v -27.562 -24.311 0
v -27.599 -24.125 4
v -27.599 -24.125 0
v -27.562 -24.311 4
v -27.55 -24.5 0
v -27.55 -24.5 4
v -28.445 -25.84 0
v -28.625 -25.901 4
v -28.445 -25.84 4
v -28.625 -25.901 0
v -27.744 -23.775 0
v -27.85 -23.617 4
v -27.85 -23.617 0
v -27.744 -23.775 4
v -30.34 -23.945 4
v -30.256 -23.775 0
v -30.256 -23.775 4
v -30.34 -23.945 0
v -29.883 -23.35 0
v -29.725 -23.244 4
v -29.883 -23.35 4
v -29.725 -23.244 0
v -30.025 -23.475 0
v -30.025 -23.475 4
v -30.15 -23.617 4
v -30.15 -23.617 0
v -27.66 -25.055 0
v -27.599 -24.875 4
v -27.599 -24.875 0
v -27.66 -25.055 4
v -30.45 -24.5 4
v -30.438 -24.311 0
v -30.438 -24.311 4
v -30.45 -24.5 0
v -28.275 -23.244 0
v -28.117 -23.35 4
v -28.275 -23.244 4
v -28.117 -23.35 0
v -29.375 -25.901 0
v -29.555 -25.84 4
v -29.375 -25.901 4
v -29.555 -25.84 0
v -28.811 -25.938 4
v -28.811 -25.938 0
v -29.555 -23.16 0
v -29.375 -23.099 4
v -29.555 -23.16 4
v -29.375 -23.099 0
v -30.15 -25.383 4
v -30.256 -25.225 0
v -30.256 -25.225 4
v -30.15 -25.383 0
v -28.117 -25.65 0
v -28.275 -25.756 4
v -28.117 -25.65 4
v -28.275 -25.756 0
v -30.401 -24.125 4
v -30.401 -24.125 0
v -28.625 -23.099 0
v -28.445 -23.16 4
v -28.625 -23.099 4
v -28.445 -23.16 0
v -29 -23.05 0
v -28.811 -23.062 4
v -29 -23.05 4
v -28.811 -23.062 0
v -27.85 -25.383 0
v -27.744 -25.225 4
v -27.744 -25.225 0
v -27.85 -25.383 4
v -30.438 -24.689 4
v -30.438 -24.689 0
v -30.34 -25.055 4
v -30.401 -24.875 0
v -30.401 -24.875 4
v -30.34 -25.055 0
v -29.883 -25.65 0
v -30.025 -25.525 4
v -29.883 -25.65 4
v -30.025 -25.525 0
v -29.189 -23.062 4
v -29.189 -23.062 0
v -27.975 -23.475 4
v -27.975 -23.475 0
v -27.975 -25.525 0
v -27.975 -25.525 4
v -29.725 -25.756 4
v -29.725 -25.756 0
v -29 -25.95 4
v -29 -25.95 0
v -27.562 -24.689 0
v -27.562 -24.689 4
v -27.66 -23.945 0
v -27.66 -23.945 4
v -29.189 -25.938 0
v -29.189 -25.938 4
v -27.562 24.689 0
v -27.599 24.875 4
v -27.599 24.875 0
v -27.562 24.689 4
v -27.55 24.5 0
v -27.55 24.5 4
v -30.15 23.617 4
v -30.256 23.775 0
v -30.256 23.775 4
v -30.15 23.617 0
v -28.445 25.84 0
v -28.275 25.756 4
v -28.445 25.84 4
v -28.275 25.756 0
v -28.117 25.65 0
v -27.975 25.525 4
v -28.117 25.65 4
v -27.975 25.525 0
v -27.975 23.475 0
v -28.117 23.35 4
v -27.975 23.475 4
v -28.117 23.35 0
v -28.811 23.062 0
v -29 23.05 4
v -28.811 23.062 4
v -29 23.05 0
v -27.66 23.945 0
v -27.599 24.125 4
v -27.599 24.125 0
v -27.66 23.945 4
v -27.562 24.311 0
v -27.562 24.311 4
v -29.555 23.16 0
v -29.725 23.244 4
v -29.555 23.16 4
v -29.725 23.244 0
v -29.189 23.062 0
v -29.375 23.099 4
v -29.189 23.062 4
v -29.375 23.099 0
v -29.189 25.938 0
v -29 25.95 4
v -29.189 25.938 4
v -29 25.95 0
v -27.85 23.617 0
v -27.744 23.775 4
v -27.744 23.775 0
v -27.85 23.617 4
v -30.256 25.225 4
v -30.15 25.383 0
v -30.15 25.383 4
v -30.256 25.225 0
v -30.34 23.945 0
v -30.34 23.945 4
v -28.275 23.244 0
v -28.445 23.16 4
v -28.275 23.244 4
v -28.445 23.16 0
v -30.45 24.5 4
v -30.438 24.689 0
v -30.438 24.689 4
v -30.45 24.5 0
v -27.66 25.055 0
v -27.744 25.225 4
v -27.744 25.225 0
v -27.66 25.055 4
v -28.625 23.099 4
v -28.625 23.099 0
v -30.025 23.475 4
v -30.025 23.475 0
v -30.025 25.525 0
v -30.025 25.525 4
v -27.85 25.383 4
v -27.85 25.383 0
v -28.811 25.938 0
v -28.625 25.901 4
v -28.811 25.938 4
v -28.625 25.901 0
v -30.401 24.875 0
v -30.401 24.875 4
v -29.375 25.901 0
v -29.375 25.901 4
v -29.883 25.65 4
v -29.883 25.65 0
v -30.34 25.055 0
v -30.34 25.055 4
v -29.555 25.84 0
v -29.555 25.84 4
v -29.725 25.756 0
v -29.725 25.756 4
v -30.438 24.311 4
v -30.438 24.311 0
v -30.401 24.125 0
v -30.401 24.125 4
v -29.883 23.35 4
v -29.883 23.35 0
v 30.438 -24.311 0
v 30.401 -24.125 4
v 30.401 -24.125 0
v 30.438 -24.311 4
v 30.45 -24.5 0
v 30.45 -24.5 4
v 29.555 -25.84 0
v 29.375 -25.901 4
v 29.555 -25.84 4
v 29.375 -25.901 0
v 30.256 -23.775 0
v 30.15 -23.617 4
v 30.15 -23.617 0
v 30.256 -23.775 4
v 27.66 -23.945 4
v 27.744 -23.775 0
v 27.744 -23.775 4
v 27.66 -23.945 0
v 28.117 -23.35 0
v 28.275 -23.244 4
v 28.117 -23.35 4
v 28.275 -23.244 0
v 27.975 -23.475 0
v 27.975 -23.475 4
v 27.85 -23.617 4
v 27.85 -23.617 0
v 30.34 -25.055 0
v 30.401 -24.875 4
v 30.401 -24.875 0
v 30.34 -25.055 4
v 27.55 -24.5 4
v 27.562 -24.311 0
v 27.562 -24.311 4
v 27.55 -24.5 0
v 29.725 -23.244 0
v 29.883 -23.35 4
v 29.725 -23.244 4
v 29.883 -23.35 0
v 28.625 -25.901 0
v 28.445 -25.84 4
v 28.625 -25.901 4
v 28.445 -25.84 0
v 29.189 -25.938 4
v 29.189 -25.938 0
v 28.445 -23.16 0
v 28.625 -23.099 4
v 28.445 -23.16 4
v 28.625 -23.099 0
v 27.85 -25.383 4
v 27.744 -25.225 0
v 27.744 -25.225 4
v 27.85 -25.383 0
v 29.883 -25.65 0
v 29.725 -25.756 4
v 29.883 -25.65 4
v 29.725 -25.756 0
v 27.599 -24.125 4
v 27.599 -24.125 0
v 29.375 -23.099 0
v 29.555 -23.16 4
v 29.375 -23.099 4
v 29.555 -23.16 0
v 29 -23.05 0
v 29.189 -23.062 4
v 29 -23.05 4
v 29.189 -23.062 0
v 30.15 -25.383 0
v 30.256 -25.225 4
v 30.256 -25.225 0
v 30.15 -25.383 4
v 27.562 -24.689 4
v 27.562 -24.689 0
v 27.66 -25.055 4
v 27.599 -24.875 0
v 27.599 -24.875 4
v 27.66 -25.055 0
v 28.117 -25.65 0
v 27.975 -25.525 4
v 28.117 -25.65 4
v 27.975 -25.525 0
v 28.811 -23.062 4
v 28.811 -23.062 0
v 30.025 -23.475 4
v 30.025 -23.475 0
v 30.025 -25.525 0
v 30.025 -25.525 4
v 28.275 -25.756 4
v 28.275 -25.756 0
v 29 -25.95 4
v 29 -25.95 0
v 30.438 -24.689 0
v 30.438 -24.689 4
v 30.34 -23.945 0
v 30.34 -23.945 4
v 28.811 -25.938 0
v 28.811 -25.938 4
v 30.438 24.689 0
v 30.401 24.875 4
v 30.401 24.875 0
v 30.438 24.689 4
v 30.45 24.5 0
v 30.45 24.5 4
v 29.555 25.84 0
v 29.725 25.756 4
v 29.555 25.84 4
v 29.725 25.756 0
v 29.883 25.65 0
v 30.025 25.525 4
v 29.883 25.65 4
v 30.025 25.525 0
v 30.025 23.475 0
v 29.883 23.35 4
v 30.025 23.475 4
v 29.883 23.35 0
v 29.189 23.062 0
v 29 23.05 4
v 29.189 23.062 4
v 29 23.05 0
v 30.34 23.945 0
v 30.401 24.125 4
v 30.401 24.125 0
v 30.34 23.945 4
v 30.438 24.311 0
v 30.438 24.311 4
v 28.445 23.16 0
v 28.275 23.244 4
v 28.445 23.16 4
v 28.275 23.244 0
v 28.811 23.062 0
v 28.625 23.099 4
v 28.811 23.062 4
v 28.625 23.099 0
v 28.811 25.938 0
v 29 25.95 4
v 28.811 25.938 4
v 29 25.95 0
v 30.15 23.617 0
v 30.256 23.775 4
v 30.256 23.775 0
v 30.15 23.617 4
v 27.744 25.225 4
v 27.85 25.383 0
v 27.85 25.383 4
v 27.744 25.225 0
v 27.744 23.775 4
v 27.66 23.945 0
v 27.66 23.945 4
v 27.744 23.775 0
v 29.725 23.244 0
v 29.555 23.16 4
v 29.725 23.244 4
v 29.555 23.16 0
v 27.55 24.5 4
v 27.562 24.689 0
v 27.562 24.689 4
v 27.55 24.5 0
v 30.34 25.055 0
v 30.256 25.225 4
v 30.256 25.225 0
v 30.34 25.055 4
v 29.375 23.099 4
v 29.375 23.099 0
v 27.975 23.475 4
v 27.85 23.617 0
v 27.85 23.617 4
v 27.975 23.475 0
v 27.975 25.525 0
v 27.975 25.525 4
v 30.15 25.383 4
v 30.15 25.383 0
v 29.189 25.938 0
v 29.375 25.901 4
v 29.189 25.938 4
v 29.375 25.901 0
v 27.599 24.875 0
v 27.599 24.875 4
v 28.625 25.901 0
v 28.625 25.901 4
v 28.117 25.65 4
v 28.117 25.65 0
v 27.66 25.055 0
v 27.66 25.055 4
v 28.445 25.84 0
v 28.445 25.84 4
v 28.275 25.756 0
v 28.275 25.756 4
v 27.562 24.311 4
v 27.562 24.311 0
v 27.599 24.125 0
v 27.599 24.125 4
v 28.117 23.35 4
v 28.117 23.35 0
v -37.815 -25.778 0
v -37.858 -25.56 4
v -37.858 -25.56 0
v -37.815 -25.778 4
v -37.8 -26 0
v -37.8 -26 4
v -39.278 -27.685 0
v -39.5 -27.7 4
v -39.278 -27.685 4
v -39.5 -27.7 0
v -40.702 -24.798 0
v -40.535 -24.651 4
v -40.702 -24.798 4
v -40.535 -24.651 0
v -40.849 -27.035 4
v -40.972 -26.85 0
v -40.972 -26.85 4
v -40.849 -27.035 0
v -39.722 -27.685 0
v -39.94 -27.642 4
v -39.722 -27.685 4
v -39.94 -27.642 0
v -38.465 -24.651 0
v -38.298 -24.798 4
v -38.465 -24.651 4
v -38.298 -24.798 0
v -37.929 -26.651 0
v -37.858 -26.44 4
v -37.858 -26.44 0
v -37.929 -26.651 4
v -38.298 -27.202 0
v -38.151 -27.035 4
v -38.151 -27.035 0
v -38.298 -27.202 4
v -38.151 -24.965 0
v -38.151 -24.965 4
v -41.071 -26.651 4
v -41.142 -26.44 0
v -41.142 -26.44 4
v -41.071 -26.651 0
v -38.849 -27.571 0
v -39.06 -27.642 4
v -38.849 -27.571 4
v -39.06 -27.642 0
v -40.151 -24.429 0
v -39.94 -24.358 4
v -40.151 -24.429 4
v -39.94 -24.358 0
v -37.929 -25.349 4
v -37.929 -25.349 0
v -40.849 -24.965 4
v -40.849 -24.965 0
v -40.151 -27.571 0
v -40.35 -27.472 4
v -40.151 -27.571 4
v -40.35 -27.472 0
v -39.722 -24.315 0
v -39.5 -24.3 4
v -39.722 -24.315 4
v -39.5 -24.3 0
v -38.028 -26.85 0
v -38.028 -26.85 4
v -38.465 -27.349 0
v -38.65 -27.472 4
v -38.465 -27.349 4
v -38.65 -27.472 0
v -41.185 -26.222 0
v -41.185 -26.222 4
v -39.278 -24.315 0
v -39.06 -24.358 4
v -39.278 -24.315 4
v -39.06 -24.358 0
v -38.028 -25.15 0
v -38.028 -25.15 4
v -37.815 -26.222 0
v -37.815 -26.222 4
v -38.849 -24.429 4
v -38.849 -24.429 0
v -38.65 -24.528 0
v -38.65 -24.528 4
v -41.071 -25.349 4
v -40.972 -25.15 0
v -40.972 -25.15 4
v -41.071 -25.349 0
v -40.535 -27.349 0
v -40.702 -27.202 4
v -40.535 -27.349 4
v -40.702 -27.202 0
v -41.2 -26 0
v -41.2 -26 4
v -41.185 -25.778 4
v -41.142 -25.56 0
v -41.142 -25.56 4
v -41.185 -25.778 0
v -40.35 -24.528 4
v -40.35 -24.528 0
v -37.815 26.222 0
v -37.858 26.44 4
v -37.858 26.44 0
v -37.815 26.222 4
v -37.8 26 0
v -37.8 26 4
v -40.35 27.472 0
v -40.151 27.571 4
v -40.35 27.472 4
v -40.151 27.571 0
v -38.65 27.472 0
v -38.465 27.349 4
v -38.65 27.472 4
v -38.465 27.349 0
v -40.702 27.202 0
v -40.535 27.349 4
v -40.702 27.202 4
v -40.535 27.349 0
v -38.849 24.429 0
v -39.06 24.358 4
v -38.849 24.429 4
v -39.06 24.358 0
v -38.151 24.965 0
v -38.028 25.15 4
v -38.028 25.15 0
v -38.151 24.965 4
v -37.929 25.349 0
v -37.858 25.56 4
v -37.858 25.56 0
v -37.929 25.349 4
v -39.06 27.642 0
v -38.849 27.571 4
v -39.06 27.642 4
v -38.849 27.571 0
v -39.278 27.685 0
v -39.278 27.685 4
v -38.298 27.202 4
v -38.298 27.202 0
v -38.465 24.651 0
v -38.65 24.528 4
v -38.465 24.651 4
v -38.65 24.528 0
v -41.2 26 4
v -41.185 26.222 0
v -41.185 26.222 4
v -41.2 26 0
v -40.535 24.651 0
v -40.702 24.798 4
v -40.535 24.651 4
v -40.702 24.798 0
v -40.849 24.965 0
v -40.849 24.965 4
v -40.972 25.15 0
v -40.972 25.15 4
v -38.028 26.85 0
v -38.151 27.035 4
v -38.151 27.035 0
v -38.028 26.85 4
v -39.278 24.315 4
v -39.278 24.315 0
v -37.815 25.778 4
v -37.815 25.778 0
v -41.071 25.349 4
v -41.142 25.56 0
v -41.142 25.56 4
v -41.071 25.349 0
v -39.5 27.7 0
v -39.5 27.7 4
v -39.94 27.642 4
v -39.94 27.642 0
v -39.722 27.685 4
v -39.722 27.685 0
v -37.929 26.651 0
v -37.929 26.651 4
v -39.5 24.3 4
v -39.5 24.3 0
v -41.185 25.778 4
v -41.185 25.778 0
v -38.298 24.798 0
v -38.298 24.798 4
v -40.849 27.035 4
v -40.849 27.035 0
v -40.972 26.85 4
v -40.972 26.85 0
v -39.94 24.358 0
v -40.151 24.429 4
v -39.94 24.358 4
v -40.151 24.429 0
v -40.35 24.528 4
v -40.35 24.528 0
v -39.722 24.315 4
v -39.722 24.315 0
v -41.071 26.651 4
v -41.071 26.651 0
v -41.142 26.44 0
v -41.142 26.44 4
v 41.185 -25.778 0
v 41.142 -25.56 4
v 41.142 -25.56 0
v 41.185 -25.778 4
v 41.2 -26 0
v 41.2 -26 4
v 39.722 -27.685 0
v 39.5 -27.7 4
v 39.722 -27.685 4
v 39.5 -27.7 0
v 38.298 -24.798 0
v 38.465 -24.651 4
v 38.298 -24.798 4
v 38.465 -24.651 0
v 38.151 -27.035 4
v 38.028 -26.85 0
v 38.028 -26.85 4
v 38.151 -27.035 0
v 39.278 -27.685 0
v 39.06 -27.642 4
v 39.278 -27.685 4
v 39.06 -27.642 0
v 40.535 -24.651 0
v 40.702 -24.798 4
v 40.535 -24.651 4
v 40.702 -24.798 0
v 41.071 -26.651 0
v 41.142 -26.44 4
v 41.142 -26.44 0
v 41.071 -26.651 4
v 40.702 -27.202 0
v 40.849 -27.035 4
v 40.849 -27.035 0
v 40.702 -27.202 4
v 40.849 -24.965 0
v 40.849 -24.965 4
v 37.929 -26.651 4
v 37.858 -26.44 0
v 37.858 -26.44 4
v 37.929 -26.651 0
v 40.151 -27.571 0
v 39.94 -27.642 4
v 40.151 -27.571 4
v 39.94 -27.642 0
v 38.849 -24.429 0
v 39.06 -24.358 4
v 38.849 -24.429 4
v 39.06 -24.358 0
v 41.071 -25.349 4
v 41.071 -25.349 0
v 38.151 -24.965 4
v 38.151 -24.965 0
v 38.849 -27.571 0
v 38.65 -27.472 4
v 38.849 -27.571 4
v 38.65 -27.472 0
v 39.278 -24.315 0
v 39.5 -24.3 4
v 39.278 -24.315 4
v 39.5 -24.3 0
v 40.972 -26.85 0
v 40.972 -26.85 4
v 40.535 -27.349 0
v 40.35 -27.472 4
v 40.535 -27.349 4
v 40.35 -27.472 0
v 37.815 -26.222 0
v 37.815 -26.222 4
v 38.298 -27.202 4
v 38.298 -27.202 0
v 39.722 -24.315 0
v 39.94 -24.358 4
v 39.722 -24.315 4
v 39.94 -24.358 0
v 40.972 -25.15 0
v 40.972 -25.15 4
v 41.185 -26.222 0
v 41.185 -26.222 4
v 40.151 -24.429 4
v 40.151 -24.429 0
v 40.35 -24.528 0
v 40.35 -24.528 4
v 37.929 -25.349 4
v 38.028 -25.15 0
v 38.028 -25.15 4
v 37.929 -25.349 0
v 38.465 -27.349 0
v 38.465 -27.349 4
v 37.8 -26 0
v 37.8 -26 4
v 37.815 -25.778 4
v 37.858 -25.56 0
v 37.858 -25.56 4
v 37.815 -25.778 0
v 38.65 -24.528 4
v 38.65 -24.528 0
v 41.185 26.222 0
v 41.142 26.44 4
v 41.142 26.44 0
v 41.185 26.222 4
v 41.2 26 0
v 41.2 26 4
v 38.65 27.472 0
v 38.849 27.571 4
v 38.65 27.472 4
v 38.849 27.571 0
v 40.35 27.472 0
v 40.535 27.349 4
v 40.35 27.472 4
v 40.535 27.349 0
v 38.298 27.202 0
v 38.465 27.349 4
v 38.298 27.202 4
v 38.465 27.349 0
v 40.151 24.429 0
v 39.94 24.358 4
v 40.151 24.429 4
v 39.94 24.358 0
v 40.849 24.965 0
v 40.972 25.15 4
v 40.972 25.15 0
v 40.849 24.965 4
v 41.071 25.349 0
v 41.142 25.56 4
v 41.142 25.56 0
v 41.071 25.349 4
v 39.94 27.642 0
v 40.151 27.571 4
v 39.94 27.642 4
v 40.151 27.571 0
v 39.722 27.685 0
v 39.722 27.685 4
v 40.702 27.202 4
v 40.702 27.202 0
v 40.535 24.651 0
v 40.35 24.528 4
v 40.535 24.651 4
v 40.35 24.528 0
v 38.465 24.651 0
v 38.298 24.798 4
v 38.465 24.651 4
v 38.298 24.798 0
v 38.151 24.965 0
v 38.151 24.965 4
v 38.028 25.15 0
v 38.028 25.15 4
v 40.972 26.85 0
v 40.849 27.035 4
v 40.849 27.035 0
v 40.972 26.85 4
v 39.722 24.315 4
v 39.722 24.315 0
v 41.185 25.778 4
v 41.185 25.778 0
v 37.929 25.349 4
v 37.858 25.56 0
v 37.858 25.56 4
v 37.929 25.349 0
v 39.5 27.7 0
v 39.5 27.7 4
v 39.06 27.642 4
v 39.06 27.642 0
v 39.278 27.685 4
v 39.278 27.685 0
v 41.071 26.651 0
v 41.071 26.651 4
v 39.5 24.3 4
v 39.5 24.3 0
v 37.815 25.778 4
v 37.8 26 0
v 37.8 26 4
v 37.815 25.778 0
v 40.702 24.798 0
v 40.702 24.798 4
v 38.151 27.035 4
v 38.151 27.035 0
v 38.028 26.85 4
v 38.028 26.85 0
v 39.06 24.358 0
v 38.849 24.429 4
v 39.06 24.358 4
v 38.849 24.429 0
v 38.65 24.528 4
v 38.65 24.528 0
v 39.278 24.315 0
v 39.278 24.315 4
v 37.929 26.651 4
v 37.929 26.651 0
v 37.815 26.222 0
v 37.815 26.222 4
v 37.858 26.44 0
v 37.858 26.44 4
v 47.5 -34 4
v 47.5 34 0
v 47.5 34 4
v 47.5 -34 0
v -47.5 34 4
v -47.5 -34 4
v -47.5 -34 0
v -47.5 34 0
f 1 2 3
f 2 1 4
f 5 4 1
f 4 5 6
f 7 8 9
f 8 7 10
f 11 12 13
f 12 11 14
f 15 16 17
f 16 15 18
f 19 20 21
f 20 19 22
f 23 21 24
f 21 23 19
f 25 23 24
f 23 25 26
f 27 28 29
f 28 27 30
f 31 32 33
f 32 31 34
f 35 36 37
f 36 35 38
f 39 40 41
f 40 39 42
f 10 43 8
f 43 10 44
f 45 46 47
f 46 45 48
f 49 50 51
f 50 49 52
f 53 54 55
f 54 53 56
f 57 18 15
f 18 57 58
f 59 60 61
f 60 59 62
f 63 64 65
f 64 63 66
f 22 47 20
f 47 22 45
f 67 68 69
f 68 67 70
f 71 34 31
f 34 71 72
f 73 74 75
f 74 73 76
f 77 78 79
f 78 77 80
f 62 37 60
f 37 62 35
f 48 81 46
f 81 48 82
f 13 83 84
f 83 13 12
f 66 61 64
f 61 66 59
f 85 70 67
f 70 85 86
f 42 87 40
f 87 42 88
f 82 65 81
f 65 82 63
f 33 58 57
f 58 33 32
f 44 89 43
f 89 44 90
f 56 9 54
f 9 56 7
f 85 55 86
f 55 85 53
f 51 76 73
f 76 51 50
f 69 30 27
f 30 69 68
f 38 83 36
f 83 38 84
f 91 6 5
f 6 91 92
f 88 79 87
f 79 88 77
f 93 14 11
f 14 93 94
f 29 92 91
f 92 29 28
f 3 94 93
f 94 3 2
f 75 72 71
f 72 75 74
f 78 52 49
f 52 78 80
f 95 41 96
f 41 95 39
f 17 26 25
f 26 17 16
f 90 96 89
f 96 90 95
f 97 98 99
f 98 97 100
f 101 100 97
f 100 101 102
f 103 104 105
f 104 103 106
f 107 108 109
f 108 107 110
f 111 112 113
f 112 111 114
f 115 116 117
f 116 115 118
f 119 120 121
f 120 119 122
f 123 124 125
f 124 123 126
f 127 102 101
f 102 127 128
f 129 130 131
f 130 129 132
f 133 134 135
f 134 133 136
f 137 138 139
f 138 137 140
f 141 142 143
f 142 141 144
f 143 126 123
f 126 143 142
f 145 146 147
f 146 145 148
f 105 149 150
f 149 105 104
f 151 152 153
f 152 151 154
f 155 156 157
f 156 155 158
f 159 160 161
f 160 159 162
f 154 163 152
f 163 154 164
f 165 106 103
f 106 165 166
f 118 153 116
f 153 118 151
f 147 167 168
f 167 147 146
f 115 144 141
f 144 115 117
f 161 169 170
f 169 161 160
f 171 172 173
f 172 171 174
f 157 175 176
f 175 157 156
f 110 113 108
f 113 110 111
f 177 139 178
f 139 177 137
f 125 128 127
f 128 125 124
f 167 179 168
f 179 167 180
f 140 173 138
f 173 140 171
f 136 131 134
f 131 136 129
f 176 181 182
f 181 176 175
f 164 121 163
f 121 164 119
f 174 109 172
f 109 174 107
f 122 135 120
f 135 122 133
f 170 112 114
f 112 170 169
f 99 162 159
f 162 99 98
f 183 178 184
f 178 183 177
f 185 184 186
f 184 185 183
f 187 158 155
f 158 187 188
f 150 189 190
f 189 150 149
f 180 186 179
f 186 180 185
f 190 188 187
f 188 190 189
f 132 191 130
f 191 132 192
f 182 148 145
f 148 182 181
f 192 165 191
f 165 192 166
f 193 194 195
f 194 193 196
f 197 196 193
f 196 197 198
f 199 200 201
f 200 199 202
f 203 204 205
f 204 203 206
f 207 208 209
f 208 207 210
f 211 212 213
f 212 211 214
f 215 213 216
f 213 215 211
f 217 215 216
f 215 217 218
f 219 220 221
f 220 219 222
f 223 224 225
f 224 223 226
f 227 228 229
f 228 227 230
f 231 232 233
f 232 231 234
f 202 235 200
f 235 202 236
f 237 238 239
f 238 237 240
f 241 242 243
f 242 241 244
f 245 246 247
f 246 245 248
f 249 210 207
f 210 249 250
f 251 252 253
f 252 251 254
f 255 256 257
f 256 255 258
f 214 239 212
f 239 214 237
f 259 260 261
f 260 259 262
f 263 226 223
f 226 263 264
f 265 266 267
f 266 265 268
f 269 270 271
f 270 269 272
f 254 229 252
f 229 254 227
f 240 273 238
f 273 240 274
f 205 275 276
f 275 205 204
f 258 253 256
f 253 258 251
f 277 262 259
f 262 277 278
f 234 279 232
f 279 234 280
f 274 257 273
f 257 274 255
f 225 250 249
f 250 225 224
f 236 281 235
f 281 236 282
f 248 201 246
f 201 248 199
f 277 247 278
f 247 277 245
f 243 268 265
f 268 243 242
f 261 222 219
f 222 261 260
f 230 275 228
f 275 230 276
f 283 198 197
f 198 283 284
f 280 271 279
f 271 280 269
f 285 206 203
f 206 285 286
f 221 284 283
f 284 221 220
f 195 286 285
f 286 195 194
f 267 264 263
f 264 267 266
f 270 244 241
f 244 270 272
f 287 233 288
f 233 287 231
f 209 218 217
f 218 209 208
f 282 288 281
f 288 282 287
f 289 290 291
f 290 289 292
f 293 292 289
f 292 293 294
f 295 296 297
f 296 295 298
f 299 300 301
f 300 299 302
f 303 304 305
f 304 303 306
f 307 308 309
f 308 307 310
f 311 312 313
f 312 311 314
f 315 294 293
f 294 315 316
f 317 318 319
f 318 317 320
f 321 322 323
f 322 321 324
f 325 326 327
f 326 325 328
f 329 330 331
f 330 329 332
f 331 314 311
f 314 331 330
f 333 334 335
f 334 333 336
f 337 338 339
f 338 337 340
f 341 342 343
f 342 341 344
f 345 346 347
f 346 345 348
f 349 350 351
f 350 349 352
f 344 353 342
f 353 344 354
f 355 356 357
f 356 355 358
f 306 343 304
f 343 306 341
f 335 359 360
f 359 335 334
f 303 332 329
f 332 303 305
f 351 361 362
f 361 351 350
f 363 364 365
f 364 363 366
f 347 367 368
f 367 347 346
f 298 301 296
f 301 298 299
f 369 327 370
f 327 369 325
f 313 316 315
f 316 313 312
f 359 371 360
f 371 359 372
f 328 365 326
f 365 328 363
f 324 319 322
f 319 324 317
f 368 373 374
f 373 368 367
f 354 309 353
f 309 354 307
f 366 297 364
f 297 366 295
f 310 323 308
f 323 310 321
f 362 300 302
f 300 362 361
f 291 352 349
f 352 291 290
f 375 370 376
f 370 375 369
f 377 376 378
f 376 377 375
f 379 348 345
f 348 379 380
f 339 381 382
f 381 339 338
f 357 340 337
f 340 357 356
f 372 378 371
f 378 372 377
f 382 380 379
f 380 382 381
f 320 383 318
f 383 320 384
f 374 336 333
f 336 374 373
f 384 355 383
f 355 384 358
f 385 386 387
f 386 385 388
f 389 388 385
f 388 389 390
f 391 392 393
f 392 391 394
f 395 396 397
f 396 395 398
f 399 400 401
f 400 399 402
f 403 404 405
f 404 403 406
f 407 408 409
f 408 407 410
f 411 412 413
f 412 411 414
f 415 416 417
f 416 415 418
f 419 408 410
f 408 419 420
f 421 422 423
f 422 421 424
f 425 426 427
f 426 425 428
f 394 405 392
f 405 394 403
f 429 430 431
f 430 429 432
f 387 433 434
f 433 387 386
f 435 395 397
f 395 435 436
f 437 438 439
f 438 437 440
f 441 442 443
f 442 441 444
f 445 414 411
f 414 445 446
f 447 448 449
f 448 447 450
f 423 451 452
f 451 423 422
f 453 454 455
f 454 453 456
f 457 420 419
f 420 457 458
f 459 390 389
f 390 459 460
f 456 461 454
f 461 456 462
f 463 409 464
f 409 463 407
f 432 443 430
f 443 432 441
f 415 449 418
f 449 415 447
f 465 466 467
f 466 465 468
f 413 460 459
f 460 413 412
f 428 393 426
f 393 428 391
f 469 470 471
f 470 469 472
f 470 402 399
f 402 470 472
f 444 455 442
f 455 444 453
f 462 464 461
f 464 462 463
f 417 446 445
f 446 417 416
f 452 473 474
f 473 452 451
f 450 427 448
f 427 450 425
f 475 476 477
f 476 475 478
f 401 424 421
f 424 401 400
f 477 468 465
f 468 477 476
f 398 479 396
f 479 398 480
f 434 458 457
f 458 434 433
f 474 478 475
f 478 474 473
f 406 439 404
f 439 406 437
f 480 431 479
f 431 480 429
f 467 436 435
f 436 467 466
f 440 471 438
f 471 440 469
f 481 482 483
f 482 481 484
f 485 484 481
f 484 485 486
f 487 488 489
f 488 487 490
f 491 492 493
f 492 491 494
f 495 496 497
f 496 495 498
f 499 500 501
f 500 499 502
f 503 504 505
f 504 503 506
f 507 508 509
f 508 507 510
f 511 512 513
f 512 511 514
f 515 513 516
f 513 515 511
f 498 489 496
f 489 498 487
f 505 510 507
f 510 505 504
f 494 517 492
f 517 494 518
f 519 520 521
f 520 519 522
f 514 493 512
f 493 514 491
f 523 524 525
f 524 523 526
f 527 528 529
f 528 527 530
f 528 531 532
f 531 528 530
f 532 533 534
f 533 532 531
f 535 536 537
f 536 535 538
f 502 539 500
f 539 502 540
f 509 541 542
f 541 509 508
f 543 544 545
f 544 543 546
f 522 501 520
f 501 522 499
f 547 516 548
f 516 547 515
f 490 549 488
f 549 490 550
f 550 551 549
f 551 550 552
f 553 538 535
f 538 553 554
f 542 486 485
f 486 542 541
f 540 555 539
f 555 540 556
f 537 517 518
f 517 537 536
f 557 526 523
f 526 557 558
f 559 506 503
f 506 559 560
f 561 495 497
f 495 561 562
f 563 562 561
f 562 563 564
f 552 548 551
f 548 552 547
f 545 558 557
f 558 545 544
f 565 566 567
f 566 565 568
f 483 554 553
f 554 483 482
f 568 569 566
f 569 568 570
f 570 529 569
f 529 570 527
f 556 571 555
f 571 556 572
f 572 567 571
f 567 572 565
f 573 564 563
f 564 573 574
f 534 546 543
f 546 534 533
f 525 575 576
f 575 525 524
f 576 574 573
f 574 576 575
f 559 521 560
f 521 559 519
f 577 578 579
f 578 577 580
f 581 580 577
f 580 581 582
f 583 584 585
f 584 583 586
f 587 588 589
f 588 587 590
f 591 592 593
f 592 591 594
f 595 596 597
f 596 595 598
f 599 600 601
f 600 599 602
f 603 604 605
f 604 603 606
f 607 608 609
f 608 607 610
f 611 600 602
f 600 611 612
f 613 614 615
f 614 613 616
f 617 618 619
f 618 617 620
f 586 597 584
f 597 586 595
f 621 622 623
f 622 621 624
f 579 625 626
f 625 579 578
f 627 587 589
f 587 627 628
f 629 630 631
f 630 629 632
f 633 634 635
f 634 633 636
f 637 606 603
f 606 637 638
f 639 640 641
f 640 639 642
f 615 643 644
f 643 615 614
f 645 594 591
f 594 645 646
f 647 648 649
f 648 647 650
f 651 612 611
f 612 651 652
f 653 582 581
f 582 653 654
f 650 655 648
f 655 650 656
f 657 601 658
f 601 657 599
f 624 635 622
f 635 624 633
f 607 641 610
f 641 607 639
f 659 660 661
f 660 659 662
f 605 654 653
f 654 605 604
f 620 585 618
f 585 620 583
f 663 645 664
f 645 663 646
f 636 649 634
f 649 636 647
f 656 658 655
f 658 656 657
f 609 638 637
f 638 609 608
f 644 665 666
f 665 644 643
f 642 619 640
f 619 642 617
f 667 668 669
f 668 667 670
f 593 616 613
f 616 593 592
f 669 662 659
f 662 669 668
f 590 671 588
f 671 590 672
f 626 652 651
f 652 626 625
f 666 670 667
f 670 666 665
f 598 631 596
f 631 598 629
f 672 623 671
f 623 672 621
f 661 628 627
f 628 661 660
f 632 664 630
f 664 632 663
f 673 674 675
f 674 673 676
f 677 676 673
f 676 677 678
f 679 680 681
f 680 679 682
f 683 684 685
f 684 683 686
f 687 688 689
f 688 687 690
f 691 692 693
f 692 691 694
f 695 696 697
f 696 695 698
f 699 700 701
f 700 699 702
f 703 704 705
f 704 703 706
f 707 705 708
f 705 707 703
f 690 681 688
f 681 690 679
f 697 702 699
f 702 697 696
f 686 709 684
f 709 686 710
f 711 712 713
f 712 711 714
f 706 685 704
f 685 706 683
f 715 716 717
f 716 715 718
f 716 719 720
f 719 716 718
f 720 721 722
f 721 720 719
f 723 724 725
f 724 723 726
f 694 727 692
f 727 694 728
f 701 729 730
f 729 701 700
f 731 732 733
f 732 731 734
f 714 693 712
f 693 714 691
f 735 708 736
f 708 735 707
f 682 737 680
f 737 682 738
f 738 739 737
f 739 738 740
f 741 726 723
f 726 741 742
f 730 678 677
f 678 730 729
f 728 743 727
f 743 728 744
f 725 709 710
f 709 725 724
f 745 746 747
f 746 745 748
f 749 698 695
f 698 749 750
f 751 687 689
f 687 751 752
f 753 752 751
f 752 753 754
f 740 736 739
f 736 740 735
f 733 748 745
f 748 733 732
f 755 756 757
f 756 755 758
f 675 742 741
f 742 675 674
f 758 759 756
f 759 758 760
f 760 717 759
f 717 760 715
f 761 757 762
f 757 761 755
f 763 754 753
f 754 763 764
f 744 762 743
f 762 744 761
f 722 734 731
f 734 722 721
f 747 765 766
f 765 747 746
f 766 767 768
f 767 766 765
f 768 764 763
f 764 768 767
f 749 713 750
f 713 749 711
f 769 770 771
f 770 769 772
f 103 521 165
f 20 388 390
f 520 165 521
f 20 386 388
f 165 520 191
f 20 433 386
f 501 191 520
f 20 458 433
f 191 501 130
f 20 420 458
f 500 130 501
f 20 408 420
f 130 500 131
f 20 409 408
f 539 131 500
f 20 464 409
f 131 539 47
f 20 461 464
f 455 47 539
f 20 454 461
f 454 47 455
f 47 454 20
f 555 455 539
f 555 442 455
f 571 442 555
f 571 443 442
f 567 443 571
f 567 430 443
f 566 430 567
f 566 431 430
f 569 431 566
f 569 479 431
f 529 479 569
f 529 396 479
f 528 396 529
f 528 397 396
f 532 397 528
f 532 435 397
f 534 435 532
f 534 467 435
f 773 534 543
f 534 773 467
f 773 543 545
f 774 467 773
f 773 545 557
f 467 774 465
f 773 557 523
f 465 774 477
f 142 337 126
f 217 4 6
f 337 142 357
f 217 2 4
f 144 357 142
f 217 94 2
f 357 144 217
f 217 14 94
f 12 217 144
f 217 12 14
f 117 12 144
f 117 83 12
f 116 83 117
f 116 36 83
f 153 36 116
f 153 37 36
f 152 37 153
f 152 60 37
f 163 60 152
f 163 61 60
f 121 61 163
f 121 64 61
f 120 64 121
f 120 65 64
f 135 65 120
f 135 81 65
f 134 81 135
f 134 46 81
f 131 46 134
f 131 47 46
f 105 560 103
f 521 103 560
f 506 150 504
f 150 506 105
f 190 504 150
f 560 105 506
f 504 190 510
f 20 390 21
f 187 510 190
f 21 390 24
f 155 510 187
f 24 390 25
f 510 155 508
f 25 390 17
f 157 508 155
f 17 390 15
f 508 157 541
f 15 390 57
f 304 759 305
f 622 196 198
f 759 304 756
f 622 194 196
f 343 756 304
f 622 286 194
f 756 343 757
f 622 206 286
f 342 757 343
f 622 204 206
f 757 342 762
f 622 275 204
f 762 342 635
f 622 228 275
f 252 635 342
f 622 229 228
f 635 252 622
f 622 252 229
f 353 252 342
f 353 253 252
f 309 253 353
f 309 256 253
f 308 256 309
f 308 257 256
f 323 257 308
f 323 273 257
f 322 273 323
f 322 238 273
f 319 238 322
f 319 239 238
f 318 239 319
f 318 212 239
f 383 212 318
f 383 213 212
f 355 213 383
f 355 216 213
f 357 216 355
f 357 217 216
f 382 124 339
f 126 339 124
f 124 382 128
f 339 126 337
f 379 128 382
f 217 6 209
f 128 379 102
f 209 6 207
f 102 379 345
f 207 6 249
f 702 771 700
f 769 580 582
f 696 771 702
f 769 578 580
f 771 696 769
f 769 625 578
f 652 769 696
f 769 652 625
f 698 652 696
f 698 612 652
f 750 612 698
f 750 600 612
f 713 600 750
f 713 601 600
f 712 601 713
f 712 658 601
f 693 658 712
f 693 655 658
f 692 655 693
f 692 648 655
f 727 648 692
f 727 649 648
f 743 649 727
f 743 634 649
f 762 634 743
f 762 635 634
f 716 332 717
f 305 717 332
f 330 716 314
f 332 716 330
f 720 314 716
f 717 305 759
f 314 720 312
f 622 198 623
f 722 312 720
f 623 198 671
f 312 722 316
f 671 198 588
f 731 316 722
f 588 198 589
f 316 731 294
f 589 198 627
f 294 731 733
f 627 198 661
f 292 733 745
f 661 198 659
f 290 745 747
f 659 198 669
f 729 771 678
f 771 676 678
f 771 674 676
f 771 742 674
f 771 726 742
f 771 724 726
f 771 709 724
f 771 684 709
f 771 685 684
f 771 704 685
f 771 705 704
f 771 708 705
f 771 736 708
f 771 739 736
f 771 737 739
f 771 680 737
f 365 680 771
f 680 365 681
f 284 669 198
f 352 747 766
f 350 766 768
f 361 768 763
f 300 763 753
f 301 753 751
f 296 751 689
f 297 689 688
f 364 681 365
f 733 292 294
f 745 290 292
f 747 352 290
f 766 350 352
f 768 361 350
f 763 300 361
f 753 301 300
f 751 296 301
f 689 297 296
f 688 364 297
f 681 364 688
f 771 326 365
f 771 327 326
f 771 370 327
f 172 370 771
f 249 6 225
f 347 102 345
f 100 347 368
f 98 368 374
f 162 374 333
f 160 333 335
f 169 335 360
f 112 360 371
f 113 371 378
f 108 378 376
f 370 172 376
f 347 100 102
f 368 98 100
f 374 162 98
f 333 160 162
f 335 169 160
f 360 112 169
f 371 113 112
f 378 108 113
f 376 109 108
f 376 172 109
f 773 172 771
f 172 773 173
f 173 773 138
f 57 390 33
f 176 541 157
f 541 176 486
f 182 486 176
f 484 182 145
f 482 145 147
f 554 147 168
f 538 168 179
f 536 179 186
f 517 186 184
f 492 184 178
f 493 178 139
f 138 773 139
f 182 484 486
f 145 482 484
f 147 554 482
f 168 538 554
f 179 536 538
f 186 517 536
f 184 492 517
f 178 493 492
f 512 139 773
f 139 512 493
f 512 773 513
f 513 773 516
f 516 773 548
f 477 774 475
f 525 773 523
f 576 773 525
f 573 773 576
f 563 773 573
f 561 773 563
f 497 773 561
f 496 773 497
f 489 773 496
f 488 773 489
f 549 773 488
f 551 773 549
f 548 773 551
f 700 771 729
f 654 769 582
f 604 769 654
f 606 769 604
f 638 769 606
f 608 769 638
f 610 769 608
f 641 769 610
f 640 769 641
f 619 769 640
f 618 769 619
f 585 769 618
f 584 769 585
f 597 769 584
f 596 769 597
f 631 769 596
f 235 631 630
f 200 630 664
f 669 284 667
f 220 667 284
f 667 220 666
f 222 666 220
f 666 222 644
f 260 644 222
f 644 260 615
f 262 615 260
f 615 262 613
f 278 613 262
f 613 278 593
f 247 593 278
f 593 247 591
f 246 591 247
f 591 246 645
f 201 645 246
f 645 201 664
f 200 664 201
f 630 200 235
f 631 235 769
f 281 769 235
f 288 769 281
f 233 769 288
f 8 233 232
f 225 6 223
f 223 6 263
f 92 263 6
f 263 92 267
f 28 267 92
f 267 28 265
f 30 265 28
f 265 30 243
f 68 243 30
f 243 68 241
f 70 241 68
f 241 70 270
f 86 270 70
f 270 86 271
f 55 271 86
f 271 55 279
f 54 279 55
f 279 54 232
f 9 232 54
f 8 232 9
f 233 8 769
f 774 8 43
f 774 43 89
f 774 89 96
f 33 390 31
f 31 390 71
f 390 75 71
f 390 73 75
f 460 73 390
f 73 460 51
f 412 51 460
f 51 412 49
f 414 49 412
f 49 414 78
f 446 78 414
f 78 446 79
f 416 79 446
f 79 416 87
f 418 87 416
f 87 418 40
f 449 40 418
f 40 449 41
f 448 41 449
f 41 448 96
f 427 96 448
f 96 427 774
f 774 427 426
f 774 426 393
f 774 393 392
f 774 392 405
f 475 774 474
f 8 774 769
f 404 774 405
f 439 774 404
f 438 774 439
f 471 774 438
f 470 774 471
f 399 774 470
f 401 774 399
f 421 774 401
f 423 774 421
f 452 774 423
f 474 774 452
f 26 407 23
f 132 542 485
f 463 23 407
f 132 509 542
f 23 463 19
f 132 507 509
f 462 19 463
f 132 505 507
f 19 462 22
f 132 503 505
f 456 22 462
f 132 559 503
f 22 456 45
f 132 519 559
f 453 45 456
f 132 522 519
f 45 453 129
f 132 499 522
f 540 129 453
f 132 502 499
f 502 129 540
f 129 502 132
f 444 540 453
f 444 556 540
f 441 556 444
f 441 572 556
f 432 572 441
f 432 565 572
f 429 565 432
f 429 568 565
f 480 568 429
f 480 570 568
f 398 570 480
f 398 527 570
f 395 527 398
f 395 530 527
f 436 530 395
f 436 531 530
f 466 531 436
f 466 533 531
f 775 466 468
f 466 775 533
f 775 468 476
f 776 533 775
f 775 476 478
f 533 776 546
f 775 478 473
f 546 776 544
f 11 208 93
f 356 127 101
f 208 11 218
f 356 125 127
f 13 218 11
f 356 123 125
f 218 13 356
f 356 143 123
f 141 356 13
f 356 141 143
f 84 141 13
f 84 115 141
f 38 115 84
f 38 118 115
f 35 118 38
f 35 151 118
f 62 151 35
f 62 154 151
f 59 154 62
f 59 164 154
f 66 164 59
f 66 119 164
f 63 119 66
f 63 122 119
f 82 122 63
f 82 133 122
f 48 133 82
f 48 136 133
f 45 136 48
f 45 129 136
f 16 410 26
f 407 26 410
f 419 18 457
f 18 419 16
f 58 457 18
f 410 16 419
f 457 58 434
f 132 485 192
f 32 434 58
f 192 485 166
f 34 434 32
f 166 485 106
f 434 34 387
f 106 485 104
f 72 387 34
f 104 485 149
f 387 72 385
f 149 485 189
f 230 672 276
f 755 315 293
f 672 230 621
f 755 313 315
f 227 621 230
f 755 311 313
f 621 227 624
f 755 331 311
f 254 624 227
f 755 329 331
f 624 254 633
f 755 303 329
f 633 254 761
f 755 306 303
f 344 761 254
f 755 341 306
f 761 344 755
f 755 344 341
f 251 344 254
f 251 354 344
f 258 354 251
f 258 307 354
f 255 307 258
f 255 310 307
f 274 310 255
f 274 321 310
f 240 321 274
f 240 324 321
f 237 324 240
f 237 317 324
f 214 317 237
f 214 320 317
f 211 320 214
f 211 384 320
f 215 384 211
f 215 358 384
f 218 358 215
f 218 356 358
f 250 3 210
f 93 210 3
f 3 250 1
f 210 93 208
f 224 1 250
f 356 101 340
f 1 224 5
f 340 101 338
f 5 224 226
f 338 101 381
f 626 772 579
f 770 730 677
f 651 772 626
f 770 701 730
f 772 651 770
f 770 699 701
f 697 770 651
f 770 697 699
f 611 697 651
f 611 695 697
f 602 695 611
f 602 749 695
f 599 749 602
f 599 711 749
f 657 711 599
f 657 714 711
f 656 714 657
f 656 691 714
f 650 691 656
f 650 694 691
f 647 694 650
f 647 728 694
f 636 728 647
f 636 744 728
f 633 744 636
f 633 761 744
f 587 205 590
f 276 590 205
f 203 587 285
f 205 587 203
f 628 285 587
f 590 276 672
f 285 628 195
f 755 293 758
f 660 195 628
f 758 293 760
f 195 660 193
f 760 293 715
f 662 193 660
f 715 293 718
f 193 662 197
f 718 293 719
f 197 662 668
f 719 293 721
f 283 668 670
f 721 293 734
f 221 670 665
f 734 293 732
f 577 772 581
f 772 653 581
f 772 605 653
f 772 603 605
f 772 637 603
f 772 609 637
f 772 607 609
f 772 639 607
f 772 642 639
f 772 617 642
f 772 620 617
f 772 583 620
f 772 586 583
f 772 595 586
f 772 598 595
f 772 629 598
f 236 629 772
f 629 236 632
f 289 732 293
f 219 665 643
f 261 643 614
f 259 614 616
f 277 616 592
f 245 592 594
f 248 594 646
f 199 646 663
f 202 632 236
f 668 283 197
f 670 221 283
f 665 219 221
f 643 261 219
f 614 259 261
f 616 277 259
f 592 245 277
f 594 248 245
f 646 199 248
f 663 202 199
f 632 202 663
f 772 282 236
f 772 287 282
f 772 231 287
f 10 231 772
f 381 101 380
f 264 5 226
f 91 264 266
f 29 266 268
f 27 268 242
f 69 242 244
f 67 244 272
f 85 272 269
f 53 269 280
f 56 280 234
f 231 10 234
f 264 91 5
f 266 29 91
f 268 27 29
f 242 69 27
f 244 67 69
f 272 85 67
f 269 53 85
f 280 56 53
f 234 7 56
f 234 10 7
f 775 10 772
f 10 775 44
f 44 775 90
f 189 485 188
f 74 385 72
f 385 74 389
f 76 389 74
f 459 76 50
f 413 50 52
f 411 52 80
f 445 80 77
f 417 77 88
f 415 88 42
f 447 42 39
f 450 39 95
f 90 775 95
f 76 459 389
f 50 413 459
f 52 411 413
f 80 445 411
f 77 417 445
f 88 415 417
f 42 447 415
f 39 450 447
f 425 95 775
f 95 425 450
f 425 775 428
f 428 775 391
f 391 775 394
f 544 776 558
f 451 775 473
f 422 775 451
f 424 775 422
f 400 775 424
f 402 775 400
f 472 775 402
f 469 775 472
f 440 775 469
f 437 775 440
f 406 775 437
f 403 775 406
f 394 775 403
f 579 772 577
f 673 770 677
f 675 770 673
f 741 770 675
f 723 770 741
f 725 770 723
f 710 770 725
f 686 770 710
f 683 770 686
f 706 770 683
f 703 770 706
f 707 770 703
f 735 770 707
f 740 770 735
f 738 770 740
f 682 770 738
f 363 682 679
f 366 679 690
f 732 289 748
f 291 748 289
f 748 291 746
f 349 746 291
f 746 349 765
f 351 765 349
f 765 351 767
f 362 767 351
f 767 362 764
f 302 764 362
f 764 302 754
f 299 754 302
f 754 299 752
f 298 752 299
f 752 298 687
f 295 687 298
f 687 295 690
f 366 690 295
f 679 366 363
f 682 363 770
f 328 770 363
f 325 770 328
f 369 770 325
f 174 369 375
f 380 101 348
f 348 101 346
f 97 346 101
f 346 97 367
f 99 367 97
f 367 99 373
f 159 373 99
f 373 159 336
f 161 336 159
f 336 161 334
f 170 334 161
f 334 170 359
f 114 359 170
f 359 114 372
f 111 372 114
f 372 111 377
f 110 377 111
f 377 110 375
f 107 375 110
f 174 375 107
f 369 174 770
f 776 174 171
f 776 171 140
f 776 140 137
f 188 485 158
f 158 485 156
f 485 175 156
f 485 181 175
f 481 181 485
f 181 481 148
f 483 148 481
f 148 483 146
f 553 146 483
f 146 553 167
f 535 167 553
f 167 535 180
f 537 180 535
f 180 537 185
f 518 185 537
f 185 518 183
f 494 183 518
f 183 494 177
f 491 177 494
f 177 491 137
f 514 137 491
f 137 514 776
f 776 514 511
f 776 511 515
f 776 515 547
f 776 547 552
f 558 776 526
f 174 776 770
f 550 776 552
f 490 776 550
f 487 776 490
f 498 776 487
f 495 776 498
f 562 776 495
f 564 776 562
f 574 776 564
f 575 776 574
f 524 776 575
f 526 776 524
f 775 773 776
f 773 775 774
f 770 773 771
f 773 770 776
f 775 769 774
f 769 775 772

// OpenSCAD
// file: helpers.scad
// Shared building blocks. Convention: every part's own joint-to-joint axis
// is local Z, so end plates are naturally perpendicular to it and holes bore
// straight along Z. Whole parts get rotated into the world only when placed
// into an assembly view - never inside a single part's own file.
include <params.scad>

// A boss with a heat-set-insert bore, sized to sit inside a wall.
module insert_boss(h) {
    difference() {
        cylinder(d = insert_d + wall, h = h);
        translate([0, 0, h - insert_depth])
            cylinder(d = insert_d, h = insert_depth + 0.1);
    }
}

// Four insert bosses in a rectangle, base sitting on z=0.
module bolt_pattern(x, y, h) {
    for (sx = [-1, 1]) for (sy = [-1, 1])
        translate([sx * x / 2, sy * y / 2, 0]) insert_boss(h);
}

// Clearance holes through a slab of thickness h, for the mating part.
module bolt_holes(x, y, d, h) {
    for (sx = [-1, 1]) for (sy = [-1, 1])
        translate([sx * x / 2, sy * y / 2, -0.1]) cylinder(d = d, h = h + 0.2);
}

// Horn-side bolt circle, holes along Z, through a slab of thickness h - see
// params.scad for why the fourth hole sits at a smaller radius.
module horn_bolt_circle(h) {
    for (a = [0, 90, 180]) rotate([0, 0, a])
        translate([horn_bolt_r_major, 0, -0.1]) cylinder(d = horn_bolt_d, h = h + 0.2);
    rotate([0, 0, 270]) translate([horn_bolt_r_minor, 0, -0.1])
        cylinder(d = horn_bolt_d, h = h + 0.2);
    translate([0, 0, -0.1]) cylinder(d = horn_hub_d, h = h + 0.2);
}

// A round plate carrying the horn bolt circle, face normal along Z, sitting
// at z=[0,h]. This is what a leg segment bolts to a servo's rotating horn.
module horn_plate(h) {
    d = horn_bolt_r_major * 2 + 10;
    difference() {
        cylinder(d = d, h = h);
        horn_bolt_circle(h);
    }
}

// A square plate carrying the bracket's own flange holes - ADJUSTABLE, see
// params.scad. This is what a leg segment bolts to the downloaded bracket.
module bracket_plate(h) {
    side = bracket_hole_x + 12;
    difference() {
        translate([-side / 2, -side / 2, 0]) cube([side, side, h]);
        bolt_holes(bracket_hole_x, bracket_hole_y, bracket_screw_d, h);
    }
}

// The ST3215 body pocket: servo drops in from the open top, its case (not
// the gearbox) bearing on the lip.
module servo_pocket(depth) {
    l = servo_l + 2 * servo_fit;
    w = servo_w + 2 * servo_fit;
    translate([-l / 2, -w / 2, 0]) cube([l, w, depth + 0.1]);
}
// file: params.scad
// ==================== source of truth ====================
// Every VERIFIED number below is cross-referenced to either this repo's own
// simulation model (src/robot_cat_description/urdf/cat.urdf.xacro at scale
// 1.0, and robot_cat_gait/leg_ik.py) or an independently checked datasheet -
// see hardware/cad/README.md for exactly what was checked and against what.
//
// ADJUSTABLE numbers are flagged because the one thing they depend on - the
// downloaded servo bracket's own mounting face - could not be fetched from
// Printables/Thingiverse in this session (both block automated access).
// Print ONE part that uses an ADJUSTABLE value, hold it against the real
// bracket, correct the number, then print the rest. Everything else here is
// safe to print in full sets straight away.

// ---- leg geometry - VERIFIED, must match leg_ik.py exactly ----
thigh_length = 110;   // LegGeometry.thigh_length, axis to axis
calf_length  = 110;   // LegGeometry.calf_length, axis to paw centre
hip_offset   = 25;    // hip roll axis -> thigh pitch axis, lateral
foot_radius  = 12;    // paw pad sphere radius

// ---- trunk geometry - VERIFIED ----
hip_x = 110;          // hip mount, x from body centre (so 220mm hip-to-hip)
hip_y = 55;           // hip mount, y from body centre (so 110mm hip-to-hip)
body_length = 300;
body_width  = 111;
body_height = 141;

// ---- ST3215 servo body - VERIFIED: DFRobot product page (2962) and
// servodatabase.com both give 45.2 x 24.7 x 35.0 mm ----
servo_l = 45.2;
servo_w = 24.7;
servo_h = 35.0;
servo_fit = 0.4;      // FDM clearance added per side around the pocket

// ---- Raspberry Pi 5 mounting - VERIFIED against the official Raspberry Pi
// Ltd mechanical drawing (RP-008347-DS-1): 58 x 49mm hole spacing, Ø2.7mm
// holes (clearance for M2.5) ----
pi_hole_x = 58;
pi_hole_y = 49;
pi_hole_d = 2.9;       // add a touch over the datasheet 2.7 for FDM tolerance

// ---- ADJUSTABLE: servo horn bolt circle ----
// Reverse-measured from a real, printed, STS3215-based quadruped
// (github.com/garciamathias/OpenRoboticDog, hip_x4.stl) - NOT the servo
// datasheet, because no datasheet with this number could be reached. Four
// holes: three at 6.7mm radius, one at 5.6mm (verified asymmetric - this is
// what the real mesh measured, not a rounding choice). Treat this as a
// well-informed starting point, not gospel: confirm on the physical horn
// before drilling the rest.
horn_bolt_r_major = 6.7;
horn_bolt_r_minor = 5.6;   // the fourth hole sits closer to centre
horn_bolt_d = 2.6;         // self-tapping screw clearance
horn_hub_d = 6.0;          // splined output shaft boss, servo horn already has this - clearance only

// ---- ADJUSTABLE: bracket-to-frame flange ----
// Printables 653674 is described as exposing "4 standard M3 machine screws"
// on its outward face once mounted to the servo, but the exact spacing could
// not be fetched (site returns 403 to automated tools). Starting guess sized
// to comfortably clear the servo body's 24.7mm width. CONFIRM AND CORRECT
// against the downloaded bracket before printing the rest.
bracket_hole_x = 20;
bracket_hole_y = 16;
bracket_screw_d = 3.4;    // M3 clearance

// ---- print structure ----
wall = 4;             // load-bearing wall thickness in PETG
insert_d = 4.2;        // M3 brass heat-set insert bore
insert_depth = 6;
$fn = 48;
// main file
// Półka pod Raspberry Pi 5 + AI HAT+. Hole pattern VERIFIED against the
// official Raspberry Pi Ltd mechanical drawing (RP-008347-DS-1): 58x49mm,
// M2.5, Ø2.7mm holes. Board outline is 85x58mm per the same drawing - the
// shelf is sized with a margin around that.
//
// Plain clearance holes, not printed bosses: montaz.pdf's parts list
// already has M2,5 standoffs to buy for this - use those between the shelf
// and the Pi board rather than threading into printed plastic.
//
// Corner tabs are generic M3 through-holes, not tied to a specific frame
// position: zip-tie or screw the shelf to the trunk_frame's cross braces
// wherever it lands clear of the servo pads and near its own converter -
// per montaz.pdf, that means away from the corners where ID1 sits, close to
// the 5V/5A line, with clearance above for the Active Cooler.
include <params.scad>
include <helpers.scad>

plate_l = 95;
plate_w = 68;

module pi_shelf() {
    difference() {
        translate([-plate_l / 2, -plate_w / 2, 0]) cube([plate_l, plate_w, wall]);
        translate([0, 0, -0.1]) bolt_holes(pi_hole_x, pi_hole_y, pi_hole_d, wall + 0.2);
        for (sx = [-1, 1]) for (sy = [-1, 1])
            translate([sx * (plate_l / 2 - 8), sy * (plate_w / 2 - 8), -0.1])
                cylinder(d = 3.4, h = wall + 0.2);
    }
}

pi_shelf();
